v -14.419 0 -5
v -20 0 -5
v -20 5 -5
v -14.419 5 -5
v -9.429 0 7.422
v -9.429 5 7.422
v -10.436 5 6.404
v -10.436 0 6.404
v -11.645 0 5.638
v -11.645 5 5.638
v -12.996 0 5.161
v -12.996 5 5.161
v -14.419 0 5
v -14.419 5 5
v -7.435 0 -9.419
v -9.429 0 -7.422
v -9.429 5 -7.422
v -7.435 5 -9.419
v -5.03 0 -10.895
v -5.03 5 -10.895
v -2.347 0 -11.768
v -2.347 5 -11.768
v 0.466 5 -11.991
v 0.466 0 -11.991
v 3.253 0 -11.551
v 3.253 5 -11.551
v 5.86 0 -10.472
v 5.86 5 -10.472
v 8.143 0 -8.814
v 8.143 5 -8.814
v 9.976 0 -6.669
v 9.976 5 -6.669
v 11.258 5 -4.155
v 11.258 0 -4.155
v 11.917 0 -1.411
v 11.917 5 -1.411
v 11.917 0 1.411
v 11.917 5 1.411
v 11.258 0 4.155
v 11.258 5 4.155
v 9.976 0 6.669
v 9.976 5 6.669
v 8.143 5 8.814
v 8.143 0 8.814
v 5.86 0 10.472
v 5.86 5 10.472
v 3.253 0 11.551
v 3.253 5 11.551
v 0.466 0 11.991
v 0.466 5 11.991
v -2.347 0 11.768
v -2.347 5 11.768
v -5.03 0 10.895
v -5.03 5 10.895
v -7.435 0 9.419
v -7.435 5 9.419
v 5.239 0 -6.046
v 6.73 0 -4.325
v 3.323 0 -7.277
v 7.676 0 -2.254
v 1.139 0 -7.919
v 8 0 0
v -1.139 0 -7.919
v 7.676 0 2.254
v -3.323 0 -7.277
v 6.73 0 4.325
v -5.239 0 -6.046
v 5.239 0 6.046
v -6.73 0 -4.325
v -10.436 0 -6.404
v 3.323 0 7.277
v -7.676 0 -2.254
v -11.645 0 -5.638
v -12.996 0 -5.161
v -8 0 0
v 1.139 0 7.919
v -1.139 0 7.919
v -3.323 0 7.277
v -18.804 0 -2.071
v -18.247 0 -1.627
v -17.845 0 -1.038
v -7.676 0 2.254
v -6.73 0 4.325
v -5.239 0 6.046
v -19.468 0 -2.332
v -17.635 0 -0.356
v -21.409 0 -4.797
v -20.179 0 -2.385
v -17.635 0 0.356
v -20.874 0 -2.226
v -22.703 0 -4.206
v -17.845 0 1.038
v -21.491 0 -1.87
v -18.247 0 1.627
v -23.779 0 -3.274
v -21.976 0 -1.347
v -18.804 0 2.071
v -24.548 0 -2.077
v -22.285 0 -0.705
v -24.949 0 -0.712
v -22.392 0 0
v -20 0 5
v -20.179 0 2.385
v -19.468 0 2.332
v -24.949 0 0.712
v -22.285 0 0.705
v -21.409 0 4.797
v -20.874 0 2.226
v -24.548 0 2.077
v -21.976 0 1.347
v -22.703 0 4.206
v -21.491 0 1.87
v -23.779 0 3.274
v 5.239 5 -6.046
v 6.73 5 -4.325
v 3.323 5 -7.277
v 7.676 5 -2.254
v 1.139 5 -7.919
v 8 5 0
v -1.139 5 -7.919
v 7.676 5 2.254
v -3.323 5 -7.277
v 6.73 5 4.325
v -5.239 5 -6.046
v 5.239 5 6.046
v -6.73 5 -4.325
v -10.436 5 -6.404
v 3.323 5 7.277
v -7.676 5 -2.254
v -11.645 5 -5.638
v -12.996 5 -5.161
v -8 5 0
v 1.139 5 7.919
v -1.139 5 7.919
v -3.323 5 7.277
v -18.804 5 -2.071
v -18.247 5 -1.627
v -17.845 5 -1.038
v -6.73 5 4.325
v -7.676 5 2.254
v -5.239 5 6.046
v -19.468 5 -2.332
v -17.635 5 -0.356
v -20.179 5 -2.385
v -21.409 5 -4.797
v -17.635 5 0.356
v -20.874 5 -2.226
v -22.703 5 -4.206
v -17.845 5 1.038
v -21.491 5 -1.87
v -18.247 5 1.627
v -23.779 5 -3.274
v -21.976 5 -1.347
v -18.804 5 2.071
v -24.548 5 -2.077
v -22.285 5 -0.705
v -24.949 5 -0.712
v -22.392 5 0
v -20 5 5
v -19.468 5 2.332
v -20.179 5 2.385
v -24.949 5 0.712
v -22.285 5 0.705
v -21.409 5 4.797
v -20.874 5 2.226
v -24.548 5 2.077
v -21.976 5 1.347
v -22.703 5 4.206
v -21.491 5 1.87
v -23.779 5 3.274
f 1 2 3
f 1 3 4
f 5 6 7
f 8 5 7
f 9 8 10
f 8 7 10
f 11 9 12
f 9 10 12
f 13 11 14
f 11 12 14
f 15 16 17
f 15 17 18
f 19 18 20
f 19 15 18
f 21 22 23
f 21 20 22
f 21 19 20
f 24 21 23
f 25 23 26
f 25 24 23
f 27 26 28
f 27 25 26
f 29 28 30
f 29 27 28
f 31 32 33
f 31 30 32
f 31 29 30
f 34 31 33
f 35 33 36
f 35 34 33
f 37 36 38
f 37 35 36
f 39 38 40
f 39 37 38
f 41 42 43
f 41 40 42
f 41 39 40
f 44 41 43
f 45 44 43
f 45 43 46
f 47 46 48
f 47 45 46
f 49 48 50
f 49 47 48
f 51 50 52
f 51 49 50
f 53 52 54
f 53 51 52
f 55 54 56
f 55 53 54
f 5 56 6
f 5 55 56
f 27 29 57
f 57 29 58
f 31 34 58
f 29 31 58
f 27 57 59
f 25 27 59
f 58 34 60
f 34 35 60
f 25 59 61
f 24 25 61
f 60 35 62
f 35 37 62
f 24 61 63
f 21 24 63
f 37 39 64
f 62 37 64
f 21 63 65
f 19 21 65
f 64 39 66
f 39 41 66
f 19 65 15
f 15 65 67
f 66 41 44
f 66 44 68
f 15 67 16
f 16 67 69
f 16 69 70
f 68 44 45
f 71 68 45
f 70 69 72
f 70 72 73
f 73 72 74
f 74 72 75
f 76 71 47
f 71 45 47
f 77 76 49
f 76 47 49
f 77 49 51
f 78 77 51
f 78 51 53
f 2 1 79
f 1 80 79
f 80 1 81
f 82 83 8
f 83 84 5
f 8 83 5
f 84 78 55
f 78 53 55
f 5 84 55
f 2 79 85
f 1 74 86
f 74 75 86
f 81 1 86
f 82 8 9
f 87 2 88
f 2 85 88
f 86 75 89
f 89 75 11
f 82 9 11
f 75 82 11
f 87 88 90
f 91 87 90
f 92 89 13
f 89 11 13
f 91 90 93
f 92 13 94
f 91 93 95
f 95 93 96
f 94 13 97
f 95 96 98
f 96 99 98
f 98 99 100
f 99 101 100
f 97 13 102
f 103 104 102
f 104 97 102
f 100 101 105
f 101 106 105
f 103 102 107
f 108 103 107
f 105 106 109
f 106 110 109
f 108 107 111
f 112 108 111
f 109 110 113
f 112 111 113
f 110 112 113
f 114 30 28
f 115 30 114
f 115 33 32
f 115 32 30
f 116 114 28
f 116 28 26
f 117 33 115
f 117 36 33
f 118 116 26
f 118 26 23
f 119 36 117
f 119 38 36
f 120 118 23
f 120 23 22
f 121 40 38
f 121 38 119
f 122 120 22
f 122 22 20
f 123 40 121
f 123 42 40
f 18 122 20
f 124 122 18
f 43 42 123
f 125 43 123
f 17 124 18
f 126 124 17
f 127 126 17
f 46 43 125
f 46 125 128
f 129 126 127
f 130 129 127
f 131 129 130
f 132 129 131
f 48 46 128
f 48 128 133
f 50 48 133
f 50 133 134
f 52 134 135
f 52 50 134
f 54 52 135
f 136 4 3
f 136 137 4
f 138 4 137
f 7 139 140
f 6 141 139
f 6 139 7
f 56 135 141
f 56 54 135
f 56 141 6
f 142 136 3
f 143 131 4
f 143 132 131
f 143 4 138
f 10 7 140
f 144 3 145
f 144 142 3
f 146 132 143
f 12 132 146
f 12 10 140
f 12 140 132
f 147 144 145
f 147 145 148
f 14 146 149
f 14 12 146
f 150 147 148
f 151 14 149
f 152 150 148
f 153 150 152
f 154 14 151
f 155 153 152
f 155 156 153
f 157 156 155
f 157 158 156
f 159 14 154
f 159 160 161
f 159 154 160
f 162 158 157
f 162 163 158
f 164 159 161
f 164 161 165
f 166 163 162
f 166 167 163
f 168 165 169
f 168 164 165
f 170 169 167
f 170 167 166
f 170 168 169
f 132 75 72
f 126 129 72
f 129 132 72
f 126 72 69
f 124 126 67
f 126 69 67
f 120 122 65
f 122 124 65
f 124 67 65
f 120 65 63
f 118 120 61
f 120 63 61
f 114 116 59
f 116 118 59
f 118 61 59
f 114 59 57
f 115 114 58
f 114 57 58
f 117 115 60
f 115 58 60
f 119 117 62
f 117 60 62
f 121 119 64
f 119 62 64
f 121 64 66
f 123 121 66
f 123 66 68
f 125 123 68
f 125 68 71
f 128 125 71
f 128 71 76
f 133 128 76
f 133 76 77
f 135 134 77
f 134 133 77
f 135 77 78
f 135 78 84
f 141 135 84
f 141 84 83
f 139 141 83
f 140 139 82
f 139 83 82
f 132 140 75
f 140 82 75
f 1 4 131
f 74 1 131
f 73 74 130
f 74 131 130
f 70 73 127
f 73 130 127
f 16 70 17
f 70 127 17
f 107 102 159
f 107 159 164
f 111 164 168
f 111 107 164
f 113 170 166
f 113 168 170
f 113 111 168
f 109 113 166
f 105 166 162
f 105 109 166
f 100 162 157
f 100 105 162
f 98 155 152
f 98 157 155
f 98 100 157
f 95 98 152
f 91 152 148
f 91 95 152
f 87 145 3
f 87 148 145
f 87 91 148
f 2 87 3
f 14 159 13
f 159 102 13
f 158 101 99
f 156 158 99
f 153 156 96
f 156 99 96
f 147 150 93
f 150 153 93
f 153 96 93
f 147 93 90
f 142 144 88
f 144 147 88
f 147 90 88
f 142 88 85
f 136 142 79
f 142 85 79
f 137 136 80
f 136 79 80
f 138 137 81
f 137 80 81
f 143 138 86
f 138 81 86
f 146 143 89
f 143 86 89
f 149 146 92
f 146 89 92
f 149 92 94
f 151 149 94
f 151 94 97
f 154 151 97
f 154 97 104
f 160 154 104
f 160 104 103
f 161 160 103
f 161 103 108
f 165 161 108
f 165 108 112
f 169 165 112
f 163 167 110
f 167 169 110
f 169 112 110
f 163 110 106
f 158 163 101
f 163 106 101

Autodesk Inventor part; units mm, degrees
ref_plane "YZ Plane" through (0, 0, 0) normal (1, 0, 0) x (0, 1, 0)
ref_plane "XZ Plane" through (0, 0, 0) normal (0, 1, 0) x (-1, 0, 0)
ref_plane "XY Plane" through (0, 0, 0) normal (0, 0, 1) x (1, 0, 0)
sketch "Sketch1" plane through (0, 0, 0) normal (0, 1, 0) x (-1, 0, 0)
  circle A0 centre (0, 0) radius 8
  line L0 (0, 0) -> (20, 0) construction
  arc A1 (20, -5) -> (20, 5) centre (20, 0) ccw
  line L1 (20, -5) -> (10.9087, -5)
  arc A2 (10.9087, 5) -> (10.9087, -5) centre (0, 0) ccw
  line L2 (20, 5) -> (10.9087, 5)
  circle A3 centre (20, 0) radius 2.3916
  circle A4 centre (0, -2.25) radius 3.175
  point P0 (10.9087, -5)
  point P1 (10.9087, 5)
  dimension "d0" = 16
  dimension "d1" = 20
  dimension "d2" = 24
  dimension "d4" = 10
  dimension "d5" = 6.35
  dimension "d6" = 2.25
extrude "Extrusion1" add sketch "Sketch1" along normal blind 5 contours L1 A2 L2 A1
fillet "Fillet1" radius 6.35 2 edges at (-10.9087, 2.5, -5) (-10.9087, 2.5, 5)
properties part number "Capper Gate Linkage"
